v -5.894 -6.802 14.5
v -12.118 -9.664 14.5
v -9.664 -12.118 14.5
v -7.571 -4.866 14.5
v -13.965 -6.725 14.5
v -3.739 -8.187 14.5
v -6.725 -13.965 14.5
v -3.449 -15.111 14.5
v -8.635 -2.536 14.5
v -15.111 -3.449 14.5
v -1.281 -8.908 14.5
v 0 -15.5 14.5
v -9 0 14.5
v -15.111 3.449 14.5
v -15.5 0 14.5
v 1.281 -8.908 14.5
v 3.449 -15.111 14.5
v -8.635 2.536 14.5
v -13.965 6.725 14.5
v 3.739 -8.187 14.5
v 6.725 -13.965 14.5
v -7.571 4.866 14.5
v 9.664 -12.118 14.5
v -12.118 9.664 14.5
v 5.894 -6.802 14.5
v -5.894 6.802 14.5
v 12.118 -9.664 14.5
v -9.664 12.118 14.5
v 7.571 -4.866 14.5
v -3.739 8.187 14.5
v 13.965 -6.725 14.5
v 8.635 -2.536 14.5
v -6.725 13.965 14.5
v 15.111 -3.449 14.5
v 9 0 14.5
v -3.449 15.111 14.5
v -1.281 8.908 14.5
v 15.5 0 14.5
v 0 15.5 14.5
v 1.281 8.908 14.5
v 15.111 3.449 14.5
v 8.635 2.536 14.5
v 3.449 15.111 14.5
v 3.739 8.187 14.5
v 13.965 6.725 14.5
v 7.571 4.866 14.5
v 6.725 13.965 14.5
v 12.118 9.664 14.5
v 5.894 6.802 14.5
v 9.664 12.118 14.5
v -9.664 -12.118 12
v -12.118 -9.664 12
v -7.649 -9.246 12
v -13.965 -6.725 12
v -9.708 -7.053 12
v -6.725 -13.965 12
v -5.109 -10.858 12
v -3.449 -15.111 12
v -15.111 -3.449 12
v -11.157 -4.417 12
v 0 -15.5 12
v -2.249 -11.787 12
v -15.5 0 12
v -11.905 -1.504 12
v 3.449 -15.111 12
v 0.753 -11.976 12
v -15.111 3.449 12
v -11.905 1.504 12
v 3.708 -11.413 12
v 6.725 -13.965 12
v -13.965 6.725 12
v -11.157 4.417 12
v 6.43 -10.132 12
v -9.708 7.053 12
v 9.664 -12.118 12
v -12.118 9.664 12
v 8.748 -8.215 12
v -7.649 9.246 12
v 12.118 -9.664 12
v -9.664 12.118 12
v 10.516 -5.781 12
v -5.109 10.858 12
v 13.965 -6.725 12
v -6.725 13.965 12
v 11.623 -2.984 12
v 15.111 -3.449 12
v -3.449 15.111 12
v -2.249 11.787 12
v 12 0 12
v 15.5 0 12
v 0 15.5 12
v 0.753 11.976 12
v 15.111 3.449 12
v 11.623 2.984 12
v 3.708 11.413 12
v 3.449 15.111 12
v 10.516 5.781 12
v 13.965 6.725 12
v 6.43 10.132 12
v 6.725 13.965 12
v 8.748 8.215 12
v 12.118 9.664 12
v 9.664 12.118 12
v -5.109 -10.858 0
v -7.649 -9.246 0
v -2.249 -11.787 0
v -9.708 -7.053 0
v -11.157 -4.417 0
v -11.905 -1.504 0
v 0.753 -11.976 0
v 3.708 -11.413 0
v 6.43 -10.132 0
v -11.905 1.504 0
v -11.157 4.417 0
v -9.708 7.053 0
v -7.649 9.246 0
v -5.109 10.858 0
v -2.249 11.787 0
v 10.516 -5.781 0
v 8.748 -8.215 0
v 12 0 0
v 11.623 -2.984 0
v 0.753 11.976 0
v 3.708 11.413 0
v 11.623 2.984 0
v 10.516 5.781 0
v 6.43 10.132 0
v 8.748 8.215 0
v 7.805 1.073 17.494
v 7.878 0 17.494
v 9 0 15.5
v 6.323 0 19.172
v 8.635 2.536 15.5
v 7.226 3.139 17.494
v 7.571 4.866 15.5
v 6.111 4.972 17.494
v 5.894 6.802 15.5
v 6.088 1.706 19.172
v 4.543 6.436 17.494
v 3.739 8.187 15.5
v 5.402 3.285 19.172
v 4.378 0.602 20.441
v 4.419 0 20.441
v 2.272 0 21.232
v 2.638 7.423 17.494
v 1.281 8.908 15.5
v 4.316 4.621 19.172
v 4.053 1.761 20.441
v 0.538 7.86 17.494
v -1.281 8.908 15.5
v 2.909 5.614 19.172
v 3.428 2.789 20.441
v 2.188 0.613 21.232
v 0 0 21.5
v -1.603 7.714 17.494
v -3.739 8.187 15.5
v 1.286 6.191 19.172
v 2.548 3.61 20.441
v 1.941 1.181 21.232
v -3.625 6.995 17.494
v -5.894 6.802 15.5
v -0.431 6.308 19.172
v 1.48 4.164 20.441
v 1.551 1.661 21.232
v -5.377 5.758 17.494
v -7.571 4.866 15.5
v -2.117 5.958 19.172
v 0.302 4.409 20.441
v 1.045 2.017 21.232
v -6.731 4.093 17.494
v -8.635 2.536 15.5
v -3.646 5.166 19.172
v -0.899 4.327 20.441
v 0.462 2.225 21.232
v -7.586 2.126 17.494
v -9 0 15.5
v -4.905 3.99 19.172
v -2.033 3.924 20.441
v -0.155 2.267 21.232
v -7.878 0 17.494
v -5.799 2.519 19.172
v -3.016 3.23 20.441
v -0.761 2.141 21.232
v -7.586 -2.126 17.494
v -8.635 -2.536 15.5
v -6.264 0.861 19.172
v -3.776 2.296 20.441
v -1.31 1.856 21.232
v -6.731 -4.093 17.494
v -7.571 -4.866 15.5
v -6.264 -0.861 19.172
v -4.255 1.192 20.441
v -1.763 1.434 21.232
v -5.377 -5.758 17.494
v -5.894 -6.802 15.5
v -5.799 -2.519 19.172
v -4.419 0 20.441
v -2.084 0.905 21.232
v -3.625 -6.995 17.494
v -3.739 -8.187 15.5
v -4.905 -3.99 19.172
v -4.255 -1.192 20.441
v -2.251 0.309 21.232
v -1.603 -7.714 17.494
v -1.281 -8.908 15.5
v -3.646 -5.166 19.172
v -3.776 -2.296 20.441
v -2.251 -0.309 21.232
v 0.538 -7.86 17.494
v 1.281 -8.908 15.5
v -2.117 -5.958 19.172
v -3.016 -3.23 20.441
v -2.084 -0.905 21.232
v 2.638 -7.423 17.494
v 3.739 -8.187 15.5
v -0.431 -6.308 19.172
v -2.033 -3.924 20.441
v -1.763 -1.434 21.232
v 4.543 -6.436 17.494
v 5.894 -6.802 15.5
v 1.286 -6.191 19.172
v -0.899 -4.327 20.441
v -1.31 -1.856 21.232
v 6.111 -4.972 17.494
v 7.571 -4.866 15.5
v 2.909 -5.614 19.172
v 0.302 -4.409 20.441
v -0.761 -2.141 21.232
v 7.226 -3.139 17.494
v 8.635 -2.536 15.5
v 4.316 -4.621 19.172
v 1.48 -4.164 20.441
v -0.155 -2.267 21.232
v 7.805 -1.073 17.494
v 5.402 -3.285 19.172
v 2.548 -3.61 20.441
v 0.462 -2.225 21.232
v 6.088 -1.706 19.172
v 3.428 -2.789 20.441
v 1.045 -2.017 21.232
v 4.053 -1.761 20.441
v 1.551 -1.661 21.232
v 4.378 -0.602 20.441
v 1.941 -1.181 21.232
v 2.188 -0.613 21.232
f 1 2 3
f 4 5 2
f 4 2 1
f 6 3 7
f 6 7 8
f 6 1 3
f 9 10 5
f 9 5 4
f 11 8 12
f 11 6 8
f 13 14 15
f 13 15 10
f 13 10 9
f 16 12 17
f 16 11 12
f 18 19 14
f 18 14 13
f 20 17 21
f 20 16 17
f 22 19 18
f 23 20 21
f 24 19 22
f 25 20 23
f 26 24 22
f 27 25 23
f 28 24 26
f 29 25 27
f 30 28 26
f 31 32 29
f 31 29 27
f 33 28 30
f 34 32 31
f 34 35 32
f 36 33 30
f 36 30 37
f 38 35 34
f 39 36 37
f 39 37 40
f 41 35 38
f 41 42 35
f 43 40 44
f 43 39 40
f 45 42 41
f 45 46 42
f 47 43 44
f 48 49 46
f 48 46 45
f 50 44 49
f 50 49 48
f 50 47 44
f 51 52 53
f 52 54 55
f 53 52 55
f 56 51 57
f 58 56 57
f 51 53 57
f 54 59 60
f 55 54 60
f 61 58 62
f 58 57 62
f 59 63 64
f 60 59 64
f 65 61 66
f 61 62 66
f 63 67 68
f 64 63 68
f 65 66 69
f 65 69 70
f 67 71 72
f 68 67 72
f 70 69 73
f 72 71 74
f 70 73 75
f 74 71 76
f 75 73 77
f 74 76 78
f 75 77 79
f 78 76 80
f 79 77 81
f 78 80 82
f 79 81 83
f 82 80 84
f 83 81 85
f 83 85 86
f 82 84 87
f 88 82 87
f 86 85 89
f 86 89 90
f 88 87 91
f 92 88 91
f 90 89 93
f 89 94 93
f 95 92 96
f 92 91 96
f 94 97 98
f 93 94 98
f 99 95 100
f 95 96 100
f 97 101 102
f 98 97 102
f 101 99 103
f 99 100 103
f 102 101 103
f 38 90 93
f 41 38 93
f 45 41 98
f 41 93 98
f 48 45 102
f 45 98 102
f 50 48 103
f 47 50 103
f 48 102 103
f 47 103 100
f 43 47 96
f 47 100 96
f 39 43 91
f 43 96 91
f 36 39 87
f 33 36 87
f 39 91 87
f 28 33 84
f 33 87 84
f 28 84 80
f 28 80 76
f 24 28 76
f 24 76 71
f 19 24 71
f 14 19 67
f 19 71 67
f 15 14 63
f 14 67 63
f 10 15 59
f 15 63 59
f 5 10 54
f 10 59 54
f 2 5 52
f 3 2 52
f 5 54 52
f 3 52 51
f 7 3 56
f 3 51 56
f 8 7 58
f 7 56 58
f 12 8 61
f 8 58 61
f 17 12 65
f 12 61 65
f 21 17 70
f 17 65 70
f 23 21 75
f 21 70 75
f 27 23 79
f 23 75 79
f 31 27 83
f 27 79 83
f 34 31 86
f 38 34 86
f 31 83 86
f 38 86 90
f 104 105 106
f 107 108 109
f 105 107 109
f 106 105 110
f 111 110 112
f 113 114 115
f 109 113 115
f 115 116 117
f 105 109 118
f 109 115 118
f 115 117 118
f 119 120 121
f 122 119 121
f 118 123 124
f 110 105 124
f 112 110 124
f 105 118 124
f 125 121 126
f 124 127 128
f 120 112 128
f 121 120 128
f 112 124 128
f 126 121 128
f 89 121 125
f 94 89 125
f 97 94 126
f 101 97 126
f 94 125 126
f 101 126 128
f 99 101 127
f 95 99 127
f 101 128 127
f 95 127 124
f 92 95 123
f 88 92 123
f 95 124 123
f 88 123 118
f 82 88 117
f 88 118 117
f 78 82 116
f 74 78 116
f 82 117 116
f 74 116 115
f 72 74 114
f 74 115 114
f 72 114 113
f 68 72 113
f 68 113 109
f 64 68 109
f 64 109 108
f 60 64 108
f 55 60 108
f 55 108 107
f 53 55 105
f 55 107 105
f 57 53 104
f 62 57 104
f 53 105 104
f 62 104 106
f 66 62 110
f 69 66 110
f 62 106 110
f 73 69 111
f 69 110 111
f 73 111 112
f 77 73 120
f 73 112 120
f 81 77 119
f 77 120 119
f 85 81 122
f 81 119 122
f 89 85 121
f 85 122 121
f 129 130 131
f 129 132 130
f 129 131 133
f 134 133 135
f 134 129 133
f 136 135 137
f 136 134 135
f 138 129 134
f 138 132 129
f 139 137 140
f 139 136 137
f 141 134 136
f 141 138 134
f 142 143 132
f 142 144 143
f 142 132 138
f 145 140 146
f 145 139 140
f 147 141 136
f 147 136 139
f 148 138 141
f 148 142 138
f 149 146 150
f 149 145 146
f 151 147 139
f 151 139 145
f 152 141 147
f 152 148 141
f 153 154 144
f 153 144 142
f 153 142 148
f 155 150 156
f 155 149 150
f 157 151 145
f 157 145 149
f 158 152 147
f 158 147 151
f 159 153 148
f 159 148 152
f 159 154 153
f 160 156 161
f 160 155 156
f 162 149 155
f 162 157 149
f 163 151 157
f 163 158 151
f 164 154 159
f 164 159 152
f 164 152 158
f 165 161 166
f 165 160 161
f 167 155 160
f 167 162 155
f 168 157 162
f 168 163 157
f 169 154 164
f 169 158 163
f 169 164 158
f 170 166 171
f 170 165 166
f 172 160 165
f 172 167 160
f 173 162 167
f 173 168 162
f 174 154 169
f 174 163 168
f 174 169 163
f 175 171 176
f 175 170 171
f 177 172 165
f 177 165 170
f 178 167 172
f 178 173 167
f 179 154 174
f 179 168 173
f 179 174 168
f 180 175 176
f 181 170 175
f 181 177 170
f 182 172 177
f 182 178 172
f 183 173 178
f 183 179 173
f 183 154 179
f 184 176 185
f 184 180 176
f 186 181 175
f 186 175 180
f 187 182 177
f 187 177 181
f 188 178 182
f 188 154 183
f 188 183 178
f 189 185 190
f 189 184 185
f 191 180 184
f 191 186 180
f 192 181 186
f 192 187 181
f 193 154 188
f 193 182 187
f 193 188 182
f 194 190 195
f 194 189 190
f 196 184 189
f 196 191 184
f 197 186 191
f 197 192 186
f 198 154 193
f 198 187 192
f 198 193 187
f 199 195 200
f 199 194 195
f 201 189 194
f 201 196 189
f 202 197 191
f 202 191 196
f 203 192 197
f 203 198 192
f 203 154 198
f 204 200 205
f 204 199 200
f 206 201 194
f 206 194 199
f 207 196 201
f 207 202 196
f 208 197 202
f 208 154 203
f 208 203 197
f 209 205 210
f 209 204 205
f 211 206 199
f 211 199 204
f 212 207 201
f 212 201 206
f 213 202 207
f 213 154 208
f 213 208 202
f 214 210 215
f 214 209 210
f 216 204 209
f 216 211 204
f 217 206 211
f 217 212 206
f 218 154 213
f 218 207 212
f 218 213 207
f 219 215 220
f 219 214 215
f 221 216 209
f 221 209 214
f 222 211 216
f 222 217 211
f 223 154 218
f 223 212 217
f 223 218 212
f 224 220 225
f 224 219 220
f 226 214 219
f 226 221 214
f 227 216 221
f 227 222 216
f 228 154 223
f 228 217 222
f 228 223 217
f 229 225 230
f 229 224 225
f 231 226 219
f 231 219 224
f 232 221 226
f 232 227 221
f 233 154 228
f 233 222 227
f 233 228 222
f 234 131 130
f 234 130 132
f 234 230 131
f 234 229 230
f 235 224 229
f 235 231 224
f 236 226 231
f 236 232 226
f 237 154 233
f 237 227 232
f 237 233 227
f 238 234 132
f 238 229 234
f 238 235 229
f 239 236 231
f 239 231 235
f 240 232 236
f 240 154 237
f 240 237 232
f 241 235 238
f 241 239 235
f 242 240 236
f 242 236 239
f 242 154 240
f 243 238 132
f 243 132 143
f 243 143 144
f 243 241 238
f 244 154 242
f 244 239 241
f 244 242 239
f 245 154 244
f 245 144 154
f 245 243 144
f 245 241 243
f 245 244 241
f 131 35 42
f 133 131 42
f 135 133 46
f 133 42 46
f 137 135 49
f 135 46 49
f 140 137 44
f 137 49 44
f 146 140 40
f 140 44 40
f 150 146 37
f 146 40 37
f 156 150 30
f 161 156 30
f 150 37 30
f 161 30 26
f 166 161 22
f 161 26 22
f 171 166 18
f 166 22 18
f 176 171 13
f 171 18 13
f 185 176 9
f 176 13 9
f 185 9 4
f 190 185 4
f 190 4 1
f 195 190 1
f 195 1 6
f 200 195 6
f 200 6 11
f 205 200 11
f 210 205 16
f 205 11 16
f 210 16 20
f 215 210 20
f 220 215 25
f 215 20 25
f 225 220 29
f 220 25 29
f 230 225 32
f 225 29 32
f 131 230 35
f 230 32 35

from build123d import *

# Parameters (mm, degrees)
ESQUISSE1_R       = 12
EXTRUSION1_DEPTH  = 12
ESQUISSE2_R       = 15.5
EXTRUSION2_DEPTH  = 2.5
ESQUISSE3_R       = 9
EXTRUSION3_DEPTH  = 1
D_ME1_FACE_RADIUS = 9
D_ME1_HEIGHT      = 6


with BuildPart() as part:
    # Esquisse1 → Extrusion1 (new body)
    with BuildSketch(Plane.XY):
        Circle(ESQUISSE1_R)
    extrude(amount=EXTRUSION1_DEPTH)

    # Esquisse2 → Extrusion2 (add)
    with BuildSketch(Plane.XY.offset(12)):
        Circle(ESQUISSE2_R)
    extrude(amount=EXTRUSION2_DEPTH)

    # Esquisse3 → Extrusion3 (add)
    with BuildSketch(Plane.XY.offset(14.5)):
        Circle(ESQUISSE3_R)
    extrude(amount=EXTRUSION3_DEPTH)

    # Dôme1: a dome of height H over a round flat face of radius A is a cap of a sphere of radius (A * A + H * H) / (2 * H)
    d_me1_r = (D_ME1_FACE_RADIUS * D_ME1_FACE_RADIUS + D_ME1_HEIGHT * D_ME1_HEIGHT) / (2 * D_ME1_HEIGHT)
    d_me1_base = Plane((0, 0, 15.5), z_dir=(0, 0, 1))
    with Locations(d_me1_base.offset(D_ME1_HEIGHT - d_me1_r)):
        d_me1_ball = Sphere(d_me1_r, mode=Mode.PRIVATE)
    add(split(d_me1_ball, bisect_by=d_me1_base, keep=Keep.TOP, mode=Mode.PRIVATE))


solid = part.part
